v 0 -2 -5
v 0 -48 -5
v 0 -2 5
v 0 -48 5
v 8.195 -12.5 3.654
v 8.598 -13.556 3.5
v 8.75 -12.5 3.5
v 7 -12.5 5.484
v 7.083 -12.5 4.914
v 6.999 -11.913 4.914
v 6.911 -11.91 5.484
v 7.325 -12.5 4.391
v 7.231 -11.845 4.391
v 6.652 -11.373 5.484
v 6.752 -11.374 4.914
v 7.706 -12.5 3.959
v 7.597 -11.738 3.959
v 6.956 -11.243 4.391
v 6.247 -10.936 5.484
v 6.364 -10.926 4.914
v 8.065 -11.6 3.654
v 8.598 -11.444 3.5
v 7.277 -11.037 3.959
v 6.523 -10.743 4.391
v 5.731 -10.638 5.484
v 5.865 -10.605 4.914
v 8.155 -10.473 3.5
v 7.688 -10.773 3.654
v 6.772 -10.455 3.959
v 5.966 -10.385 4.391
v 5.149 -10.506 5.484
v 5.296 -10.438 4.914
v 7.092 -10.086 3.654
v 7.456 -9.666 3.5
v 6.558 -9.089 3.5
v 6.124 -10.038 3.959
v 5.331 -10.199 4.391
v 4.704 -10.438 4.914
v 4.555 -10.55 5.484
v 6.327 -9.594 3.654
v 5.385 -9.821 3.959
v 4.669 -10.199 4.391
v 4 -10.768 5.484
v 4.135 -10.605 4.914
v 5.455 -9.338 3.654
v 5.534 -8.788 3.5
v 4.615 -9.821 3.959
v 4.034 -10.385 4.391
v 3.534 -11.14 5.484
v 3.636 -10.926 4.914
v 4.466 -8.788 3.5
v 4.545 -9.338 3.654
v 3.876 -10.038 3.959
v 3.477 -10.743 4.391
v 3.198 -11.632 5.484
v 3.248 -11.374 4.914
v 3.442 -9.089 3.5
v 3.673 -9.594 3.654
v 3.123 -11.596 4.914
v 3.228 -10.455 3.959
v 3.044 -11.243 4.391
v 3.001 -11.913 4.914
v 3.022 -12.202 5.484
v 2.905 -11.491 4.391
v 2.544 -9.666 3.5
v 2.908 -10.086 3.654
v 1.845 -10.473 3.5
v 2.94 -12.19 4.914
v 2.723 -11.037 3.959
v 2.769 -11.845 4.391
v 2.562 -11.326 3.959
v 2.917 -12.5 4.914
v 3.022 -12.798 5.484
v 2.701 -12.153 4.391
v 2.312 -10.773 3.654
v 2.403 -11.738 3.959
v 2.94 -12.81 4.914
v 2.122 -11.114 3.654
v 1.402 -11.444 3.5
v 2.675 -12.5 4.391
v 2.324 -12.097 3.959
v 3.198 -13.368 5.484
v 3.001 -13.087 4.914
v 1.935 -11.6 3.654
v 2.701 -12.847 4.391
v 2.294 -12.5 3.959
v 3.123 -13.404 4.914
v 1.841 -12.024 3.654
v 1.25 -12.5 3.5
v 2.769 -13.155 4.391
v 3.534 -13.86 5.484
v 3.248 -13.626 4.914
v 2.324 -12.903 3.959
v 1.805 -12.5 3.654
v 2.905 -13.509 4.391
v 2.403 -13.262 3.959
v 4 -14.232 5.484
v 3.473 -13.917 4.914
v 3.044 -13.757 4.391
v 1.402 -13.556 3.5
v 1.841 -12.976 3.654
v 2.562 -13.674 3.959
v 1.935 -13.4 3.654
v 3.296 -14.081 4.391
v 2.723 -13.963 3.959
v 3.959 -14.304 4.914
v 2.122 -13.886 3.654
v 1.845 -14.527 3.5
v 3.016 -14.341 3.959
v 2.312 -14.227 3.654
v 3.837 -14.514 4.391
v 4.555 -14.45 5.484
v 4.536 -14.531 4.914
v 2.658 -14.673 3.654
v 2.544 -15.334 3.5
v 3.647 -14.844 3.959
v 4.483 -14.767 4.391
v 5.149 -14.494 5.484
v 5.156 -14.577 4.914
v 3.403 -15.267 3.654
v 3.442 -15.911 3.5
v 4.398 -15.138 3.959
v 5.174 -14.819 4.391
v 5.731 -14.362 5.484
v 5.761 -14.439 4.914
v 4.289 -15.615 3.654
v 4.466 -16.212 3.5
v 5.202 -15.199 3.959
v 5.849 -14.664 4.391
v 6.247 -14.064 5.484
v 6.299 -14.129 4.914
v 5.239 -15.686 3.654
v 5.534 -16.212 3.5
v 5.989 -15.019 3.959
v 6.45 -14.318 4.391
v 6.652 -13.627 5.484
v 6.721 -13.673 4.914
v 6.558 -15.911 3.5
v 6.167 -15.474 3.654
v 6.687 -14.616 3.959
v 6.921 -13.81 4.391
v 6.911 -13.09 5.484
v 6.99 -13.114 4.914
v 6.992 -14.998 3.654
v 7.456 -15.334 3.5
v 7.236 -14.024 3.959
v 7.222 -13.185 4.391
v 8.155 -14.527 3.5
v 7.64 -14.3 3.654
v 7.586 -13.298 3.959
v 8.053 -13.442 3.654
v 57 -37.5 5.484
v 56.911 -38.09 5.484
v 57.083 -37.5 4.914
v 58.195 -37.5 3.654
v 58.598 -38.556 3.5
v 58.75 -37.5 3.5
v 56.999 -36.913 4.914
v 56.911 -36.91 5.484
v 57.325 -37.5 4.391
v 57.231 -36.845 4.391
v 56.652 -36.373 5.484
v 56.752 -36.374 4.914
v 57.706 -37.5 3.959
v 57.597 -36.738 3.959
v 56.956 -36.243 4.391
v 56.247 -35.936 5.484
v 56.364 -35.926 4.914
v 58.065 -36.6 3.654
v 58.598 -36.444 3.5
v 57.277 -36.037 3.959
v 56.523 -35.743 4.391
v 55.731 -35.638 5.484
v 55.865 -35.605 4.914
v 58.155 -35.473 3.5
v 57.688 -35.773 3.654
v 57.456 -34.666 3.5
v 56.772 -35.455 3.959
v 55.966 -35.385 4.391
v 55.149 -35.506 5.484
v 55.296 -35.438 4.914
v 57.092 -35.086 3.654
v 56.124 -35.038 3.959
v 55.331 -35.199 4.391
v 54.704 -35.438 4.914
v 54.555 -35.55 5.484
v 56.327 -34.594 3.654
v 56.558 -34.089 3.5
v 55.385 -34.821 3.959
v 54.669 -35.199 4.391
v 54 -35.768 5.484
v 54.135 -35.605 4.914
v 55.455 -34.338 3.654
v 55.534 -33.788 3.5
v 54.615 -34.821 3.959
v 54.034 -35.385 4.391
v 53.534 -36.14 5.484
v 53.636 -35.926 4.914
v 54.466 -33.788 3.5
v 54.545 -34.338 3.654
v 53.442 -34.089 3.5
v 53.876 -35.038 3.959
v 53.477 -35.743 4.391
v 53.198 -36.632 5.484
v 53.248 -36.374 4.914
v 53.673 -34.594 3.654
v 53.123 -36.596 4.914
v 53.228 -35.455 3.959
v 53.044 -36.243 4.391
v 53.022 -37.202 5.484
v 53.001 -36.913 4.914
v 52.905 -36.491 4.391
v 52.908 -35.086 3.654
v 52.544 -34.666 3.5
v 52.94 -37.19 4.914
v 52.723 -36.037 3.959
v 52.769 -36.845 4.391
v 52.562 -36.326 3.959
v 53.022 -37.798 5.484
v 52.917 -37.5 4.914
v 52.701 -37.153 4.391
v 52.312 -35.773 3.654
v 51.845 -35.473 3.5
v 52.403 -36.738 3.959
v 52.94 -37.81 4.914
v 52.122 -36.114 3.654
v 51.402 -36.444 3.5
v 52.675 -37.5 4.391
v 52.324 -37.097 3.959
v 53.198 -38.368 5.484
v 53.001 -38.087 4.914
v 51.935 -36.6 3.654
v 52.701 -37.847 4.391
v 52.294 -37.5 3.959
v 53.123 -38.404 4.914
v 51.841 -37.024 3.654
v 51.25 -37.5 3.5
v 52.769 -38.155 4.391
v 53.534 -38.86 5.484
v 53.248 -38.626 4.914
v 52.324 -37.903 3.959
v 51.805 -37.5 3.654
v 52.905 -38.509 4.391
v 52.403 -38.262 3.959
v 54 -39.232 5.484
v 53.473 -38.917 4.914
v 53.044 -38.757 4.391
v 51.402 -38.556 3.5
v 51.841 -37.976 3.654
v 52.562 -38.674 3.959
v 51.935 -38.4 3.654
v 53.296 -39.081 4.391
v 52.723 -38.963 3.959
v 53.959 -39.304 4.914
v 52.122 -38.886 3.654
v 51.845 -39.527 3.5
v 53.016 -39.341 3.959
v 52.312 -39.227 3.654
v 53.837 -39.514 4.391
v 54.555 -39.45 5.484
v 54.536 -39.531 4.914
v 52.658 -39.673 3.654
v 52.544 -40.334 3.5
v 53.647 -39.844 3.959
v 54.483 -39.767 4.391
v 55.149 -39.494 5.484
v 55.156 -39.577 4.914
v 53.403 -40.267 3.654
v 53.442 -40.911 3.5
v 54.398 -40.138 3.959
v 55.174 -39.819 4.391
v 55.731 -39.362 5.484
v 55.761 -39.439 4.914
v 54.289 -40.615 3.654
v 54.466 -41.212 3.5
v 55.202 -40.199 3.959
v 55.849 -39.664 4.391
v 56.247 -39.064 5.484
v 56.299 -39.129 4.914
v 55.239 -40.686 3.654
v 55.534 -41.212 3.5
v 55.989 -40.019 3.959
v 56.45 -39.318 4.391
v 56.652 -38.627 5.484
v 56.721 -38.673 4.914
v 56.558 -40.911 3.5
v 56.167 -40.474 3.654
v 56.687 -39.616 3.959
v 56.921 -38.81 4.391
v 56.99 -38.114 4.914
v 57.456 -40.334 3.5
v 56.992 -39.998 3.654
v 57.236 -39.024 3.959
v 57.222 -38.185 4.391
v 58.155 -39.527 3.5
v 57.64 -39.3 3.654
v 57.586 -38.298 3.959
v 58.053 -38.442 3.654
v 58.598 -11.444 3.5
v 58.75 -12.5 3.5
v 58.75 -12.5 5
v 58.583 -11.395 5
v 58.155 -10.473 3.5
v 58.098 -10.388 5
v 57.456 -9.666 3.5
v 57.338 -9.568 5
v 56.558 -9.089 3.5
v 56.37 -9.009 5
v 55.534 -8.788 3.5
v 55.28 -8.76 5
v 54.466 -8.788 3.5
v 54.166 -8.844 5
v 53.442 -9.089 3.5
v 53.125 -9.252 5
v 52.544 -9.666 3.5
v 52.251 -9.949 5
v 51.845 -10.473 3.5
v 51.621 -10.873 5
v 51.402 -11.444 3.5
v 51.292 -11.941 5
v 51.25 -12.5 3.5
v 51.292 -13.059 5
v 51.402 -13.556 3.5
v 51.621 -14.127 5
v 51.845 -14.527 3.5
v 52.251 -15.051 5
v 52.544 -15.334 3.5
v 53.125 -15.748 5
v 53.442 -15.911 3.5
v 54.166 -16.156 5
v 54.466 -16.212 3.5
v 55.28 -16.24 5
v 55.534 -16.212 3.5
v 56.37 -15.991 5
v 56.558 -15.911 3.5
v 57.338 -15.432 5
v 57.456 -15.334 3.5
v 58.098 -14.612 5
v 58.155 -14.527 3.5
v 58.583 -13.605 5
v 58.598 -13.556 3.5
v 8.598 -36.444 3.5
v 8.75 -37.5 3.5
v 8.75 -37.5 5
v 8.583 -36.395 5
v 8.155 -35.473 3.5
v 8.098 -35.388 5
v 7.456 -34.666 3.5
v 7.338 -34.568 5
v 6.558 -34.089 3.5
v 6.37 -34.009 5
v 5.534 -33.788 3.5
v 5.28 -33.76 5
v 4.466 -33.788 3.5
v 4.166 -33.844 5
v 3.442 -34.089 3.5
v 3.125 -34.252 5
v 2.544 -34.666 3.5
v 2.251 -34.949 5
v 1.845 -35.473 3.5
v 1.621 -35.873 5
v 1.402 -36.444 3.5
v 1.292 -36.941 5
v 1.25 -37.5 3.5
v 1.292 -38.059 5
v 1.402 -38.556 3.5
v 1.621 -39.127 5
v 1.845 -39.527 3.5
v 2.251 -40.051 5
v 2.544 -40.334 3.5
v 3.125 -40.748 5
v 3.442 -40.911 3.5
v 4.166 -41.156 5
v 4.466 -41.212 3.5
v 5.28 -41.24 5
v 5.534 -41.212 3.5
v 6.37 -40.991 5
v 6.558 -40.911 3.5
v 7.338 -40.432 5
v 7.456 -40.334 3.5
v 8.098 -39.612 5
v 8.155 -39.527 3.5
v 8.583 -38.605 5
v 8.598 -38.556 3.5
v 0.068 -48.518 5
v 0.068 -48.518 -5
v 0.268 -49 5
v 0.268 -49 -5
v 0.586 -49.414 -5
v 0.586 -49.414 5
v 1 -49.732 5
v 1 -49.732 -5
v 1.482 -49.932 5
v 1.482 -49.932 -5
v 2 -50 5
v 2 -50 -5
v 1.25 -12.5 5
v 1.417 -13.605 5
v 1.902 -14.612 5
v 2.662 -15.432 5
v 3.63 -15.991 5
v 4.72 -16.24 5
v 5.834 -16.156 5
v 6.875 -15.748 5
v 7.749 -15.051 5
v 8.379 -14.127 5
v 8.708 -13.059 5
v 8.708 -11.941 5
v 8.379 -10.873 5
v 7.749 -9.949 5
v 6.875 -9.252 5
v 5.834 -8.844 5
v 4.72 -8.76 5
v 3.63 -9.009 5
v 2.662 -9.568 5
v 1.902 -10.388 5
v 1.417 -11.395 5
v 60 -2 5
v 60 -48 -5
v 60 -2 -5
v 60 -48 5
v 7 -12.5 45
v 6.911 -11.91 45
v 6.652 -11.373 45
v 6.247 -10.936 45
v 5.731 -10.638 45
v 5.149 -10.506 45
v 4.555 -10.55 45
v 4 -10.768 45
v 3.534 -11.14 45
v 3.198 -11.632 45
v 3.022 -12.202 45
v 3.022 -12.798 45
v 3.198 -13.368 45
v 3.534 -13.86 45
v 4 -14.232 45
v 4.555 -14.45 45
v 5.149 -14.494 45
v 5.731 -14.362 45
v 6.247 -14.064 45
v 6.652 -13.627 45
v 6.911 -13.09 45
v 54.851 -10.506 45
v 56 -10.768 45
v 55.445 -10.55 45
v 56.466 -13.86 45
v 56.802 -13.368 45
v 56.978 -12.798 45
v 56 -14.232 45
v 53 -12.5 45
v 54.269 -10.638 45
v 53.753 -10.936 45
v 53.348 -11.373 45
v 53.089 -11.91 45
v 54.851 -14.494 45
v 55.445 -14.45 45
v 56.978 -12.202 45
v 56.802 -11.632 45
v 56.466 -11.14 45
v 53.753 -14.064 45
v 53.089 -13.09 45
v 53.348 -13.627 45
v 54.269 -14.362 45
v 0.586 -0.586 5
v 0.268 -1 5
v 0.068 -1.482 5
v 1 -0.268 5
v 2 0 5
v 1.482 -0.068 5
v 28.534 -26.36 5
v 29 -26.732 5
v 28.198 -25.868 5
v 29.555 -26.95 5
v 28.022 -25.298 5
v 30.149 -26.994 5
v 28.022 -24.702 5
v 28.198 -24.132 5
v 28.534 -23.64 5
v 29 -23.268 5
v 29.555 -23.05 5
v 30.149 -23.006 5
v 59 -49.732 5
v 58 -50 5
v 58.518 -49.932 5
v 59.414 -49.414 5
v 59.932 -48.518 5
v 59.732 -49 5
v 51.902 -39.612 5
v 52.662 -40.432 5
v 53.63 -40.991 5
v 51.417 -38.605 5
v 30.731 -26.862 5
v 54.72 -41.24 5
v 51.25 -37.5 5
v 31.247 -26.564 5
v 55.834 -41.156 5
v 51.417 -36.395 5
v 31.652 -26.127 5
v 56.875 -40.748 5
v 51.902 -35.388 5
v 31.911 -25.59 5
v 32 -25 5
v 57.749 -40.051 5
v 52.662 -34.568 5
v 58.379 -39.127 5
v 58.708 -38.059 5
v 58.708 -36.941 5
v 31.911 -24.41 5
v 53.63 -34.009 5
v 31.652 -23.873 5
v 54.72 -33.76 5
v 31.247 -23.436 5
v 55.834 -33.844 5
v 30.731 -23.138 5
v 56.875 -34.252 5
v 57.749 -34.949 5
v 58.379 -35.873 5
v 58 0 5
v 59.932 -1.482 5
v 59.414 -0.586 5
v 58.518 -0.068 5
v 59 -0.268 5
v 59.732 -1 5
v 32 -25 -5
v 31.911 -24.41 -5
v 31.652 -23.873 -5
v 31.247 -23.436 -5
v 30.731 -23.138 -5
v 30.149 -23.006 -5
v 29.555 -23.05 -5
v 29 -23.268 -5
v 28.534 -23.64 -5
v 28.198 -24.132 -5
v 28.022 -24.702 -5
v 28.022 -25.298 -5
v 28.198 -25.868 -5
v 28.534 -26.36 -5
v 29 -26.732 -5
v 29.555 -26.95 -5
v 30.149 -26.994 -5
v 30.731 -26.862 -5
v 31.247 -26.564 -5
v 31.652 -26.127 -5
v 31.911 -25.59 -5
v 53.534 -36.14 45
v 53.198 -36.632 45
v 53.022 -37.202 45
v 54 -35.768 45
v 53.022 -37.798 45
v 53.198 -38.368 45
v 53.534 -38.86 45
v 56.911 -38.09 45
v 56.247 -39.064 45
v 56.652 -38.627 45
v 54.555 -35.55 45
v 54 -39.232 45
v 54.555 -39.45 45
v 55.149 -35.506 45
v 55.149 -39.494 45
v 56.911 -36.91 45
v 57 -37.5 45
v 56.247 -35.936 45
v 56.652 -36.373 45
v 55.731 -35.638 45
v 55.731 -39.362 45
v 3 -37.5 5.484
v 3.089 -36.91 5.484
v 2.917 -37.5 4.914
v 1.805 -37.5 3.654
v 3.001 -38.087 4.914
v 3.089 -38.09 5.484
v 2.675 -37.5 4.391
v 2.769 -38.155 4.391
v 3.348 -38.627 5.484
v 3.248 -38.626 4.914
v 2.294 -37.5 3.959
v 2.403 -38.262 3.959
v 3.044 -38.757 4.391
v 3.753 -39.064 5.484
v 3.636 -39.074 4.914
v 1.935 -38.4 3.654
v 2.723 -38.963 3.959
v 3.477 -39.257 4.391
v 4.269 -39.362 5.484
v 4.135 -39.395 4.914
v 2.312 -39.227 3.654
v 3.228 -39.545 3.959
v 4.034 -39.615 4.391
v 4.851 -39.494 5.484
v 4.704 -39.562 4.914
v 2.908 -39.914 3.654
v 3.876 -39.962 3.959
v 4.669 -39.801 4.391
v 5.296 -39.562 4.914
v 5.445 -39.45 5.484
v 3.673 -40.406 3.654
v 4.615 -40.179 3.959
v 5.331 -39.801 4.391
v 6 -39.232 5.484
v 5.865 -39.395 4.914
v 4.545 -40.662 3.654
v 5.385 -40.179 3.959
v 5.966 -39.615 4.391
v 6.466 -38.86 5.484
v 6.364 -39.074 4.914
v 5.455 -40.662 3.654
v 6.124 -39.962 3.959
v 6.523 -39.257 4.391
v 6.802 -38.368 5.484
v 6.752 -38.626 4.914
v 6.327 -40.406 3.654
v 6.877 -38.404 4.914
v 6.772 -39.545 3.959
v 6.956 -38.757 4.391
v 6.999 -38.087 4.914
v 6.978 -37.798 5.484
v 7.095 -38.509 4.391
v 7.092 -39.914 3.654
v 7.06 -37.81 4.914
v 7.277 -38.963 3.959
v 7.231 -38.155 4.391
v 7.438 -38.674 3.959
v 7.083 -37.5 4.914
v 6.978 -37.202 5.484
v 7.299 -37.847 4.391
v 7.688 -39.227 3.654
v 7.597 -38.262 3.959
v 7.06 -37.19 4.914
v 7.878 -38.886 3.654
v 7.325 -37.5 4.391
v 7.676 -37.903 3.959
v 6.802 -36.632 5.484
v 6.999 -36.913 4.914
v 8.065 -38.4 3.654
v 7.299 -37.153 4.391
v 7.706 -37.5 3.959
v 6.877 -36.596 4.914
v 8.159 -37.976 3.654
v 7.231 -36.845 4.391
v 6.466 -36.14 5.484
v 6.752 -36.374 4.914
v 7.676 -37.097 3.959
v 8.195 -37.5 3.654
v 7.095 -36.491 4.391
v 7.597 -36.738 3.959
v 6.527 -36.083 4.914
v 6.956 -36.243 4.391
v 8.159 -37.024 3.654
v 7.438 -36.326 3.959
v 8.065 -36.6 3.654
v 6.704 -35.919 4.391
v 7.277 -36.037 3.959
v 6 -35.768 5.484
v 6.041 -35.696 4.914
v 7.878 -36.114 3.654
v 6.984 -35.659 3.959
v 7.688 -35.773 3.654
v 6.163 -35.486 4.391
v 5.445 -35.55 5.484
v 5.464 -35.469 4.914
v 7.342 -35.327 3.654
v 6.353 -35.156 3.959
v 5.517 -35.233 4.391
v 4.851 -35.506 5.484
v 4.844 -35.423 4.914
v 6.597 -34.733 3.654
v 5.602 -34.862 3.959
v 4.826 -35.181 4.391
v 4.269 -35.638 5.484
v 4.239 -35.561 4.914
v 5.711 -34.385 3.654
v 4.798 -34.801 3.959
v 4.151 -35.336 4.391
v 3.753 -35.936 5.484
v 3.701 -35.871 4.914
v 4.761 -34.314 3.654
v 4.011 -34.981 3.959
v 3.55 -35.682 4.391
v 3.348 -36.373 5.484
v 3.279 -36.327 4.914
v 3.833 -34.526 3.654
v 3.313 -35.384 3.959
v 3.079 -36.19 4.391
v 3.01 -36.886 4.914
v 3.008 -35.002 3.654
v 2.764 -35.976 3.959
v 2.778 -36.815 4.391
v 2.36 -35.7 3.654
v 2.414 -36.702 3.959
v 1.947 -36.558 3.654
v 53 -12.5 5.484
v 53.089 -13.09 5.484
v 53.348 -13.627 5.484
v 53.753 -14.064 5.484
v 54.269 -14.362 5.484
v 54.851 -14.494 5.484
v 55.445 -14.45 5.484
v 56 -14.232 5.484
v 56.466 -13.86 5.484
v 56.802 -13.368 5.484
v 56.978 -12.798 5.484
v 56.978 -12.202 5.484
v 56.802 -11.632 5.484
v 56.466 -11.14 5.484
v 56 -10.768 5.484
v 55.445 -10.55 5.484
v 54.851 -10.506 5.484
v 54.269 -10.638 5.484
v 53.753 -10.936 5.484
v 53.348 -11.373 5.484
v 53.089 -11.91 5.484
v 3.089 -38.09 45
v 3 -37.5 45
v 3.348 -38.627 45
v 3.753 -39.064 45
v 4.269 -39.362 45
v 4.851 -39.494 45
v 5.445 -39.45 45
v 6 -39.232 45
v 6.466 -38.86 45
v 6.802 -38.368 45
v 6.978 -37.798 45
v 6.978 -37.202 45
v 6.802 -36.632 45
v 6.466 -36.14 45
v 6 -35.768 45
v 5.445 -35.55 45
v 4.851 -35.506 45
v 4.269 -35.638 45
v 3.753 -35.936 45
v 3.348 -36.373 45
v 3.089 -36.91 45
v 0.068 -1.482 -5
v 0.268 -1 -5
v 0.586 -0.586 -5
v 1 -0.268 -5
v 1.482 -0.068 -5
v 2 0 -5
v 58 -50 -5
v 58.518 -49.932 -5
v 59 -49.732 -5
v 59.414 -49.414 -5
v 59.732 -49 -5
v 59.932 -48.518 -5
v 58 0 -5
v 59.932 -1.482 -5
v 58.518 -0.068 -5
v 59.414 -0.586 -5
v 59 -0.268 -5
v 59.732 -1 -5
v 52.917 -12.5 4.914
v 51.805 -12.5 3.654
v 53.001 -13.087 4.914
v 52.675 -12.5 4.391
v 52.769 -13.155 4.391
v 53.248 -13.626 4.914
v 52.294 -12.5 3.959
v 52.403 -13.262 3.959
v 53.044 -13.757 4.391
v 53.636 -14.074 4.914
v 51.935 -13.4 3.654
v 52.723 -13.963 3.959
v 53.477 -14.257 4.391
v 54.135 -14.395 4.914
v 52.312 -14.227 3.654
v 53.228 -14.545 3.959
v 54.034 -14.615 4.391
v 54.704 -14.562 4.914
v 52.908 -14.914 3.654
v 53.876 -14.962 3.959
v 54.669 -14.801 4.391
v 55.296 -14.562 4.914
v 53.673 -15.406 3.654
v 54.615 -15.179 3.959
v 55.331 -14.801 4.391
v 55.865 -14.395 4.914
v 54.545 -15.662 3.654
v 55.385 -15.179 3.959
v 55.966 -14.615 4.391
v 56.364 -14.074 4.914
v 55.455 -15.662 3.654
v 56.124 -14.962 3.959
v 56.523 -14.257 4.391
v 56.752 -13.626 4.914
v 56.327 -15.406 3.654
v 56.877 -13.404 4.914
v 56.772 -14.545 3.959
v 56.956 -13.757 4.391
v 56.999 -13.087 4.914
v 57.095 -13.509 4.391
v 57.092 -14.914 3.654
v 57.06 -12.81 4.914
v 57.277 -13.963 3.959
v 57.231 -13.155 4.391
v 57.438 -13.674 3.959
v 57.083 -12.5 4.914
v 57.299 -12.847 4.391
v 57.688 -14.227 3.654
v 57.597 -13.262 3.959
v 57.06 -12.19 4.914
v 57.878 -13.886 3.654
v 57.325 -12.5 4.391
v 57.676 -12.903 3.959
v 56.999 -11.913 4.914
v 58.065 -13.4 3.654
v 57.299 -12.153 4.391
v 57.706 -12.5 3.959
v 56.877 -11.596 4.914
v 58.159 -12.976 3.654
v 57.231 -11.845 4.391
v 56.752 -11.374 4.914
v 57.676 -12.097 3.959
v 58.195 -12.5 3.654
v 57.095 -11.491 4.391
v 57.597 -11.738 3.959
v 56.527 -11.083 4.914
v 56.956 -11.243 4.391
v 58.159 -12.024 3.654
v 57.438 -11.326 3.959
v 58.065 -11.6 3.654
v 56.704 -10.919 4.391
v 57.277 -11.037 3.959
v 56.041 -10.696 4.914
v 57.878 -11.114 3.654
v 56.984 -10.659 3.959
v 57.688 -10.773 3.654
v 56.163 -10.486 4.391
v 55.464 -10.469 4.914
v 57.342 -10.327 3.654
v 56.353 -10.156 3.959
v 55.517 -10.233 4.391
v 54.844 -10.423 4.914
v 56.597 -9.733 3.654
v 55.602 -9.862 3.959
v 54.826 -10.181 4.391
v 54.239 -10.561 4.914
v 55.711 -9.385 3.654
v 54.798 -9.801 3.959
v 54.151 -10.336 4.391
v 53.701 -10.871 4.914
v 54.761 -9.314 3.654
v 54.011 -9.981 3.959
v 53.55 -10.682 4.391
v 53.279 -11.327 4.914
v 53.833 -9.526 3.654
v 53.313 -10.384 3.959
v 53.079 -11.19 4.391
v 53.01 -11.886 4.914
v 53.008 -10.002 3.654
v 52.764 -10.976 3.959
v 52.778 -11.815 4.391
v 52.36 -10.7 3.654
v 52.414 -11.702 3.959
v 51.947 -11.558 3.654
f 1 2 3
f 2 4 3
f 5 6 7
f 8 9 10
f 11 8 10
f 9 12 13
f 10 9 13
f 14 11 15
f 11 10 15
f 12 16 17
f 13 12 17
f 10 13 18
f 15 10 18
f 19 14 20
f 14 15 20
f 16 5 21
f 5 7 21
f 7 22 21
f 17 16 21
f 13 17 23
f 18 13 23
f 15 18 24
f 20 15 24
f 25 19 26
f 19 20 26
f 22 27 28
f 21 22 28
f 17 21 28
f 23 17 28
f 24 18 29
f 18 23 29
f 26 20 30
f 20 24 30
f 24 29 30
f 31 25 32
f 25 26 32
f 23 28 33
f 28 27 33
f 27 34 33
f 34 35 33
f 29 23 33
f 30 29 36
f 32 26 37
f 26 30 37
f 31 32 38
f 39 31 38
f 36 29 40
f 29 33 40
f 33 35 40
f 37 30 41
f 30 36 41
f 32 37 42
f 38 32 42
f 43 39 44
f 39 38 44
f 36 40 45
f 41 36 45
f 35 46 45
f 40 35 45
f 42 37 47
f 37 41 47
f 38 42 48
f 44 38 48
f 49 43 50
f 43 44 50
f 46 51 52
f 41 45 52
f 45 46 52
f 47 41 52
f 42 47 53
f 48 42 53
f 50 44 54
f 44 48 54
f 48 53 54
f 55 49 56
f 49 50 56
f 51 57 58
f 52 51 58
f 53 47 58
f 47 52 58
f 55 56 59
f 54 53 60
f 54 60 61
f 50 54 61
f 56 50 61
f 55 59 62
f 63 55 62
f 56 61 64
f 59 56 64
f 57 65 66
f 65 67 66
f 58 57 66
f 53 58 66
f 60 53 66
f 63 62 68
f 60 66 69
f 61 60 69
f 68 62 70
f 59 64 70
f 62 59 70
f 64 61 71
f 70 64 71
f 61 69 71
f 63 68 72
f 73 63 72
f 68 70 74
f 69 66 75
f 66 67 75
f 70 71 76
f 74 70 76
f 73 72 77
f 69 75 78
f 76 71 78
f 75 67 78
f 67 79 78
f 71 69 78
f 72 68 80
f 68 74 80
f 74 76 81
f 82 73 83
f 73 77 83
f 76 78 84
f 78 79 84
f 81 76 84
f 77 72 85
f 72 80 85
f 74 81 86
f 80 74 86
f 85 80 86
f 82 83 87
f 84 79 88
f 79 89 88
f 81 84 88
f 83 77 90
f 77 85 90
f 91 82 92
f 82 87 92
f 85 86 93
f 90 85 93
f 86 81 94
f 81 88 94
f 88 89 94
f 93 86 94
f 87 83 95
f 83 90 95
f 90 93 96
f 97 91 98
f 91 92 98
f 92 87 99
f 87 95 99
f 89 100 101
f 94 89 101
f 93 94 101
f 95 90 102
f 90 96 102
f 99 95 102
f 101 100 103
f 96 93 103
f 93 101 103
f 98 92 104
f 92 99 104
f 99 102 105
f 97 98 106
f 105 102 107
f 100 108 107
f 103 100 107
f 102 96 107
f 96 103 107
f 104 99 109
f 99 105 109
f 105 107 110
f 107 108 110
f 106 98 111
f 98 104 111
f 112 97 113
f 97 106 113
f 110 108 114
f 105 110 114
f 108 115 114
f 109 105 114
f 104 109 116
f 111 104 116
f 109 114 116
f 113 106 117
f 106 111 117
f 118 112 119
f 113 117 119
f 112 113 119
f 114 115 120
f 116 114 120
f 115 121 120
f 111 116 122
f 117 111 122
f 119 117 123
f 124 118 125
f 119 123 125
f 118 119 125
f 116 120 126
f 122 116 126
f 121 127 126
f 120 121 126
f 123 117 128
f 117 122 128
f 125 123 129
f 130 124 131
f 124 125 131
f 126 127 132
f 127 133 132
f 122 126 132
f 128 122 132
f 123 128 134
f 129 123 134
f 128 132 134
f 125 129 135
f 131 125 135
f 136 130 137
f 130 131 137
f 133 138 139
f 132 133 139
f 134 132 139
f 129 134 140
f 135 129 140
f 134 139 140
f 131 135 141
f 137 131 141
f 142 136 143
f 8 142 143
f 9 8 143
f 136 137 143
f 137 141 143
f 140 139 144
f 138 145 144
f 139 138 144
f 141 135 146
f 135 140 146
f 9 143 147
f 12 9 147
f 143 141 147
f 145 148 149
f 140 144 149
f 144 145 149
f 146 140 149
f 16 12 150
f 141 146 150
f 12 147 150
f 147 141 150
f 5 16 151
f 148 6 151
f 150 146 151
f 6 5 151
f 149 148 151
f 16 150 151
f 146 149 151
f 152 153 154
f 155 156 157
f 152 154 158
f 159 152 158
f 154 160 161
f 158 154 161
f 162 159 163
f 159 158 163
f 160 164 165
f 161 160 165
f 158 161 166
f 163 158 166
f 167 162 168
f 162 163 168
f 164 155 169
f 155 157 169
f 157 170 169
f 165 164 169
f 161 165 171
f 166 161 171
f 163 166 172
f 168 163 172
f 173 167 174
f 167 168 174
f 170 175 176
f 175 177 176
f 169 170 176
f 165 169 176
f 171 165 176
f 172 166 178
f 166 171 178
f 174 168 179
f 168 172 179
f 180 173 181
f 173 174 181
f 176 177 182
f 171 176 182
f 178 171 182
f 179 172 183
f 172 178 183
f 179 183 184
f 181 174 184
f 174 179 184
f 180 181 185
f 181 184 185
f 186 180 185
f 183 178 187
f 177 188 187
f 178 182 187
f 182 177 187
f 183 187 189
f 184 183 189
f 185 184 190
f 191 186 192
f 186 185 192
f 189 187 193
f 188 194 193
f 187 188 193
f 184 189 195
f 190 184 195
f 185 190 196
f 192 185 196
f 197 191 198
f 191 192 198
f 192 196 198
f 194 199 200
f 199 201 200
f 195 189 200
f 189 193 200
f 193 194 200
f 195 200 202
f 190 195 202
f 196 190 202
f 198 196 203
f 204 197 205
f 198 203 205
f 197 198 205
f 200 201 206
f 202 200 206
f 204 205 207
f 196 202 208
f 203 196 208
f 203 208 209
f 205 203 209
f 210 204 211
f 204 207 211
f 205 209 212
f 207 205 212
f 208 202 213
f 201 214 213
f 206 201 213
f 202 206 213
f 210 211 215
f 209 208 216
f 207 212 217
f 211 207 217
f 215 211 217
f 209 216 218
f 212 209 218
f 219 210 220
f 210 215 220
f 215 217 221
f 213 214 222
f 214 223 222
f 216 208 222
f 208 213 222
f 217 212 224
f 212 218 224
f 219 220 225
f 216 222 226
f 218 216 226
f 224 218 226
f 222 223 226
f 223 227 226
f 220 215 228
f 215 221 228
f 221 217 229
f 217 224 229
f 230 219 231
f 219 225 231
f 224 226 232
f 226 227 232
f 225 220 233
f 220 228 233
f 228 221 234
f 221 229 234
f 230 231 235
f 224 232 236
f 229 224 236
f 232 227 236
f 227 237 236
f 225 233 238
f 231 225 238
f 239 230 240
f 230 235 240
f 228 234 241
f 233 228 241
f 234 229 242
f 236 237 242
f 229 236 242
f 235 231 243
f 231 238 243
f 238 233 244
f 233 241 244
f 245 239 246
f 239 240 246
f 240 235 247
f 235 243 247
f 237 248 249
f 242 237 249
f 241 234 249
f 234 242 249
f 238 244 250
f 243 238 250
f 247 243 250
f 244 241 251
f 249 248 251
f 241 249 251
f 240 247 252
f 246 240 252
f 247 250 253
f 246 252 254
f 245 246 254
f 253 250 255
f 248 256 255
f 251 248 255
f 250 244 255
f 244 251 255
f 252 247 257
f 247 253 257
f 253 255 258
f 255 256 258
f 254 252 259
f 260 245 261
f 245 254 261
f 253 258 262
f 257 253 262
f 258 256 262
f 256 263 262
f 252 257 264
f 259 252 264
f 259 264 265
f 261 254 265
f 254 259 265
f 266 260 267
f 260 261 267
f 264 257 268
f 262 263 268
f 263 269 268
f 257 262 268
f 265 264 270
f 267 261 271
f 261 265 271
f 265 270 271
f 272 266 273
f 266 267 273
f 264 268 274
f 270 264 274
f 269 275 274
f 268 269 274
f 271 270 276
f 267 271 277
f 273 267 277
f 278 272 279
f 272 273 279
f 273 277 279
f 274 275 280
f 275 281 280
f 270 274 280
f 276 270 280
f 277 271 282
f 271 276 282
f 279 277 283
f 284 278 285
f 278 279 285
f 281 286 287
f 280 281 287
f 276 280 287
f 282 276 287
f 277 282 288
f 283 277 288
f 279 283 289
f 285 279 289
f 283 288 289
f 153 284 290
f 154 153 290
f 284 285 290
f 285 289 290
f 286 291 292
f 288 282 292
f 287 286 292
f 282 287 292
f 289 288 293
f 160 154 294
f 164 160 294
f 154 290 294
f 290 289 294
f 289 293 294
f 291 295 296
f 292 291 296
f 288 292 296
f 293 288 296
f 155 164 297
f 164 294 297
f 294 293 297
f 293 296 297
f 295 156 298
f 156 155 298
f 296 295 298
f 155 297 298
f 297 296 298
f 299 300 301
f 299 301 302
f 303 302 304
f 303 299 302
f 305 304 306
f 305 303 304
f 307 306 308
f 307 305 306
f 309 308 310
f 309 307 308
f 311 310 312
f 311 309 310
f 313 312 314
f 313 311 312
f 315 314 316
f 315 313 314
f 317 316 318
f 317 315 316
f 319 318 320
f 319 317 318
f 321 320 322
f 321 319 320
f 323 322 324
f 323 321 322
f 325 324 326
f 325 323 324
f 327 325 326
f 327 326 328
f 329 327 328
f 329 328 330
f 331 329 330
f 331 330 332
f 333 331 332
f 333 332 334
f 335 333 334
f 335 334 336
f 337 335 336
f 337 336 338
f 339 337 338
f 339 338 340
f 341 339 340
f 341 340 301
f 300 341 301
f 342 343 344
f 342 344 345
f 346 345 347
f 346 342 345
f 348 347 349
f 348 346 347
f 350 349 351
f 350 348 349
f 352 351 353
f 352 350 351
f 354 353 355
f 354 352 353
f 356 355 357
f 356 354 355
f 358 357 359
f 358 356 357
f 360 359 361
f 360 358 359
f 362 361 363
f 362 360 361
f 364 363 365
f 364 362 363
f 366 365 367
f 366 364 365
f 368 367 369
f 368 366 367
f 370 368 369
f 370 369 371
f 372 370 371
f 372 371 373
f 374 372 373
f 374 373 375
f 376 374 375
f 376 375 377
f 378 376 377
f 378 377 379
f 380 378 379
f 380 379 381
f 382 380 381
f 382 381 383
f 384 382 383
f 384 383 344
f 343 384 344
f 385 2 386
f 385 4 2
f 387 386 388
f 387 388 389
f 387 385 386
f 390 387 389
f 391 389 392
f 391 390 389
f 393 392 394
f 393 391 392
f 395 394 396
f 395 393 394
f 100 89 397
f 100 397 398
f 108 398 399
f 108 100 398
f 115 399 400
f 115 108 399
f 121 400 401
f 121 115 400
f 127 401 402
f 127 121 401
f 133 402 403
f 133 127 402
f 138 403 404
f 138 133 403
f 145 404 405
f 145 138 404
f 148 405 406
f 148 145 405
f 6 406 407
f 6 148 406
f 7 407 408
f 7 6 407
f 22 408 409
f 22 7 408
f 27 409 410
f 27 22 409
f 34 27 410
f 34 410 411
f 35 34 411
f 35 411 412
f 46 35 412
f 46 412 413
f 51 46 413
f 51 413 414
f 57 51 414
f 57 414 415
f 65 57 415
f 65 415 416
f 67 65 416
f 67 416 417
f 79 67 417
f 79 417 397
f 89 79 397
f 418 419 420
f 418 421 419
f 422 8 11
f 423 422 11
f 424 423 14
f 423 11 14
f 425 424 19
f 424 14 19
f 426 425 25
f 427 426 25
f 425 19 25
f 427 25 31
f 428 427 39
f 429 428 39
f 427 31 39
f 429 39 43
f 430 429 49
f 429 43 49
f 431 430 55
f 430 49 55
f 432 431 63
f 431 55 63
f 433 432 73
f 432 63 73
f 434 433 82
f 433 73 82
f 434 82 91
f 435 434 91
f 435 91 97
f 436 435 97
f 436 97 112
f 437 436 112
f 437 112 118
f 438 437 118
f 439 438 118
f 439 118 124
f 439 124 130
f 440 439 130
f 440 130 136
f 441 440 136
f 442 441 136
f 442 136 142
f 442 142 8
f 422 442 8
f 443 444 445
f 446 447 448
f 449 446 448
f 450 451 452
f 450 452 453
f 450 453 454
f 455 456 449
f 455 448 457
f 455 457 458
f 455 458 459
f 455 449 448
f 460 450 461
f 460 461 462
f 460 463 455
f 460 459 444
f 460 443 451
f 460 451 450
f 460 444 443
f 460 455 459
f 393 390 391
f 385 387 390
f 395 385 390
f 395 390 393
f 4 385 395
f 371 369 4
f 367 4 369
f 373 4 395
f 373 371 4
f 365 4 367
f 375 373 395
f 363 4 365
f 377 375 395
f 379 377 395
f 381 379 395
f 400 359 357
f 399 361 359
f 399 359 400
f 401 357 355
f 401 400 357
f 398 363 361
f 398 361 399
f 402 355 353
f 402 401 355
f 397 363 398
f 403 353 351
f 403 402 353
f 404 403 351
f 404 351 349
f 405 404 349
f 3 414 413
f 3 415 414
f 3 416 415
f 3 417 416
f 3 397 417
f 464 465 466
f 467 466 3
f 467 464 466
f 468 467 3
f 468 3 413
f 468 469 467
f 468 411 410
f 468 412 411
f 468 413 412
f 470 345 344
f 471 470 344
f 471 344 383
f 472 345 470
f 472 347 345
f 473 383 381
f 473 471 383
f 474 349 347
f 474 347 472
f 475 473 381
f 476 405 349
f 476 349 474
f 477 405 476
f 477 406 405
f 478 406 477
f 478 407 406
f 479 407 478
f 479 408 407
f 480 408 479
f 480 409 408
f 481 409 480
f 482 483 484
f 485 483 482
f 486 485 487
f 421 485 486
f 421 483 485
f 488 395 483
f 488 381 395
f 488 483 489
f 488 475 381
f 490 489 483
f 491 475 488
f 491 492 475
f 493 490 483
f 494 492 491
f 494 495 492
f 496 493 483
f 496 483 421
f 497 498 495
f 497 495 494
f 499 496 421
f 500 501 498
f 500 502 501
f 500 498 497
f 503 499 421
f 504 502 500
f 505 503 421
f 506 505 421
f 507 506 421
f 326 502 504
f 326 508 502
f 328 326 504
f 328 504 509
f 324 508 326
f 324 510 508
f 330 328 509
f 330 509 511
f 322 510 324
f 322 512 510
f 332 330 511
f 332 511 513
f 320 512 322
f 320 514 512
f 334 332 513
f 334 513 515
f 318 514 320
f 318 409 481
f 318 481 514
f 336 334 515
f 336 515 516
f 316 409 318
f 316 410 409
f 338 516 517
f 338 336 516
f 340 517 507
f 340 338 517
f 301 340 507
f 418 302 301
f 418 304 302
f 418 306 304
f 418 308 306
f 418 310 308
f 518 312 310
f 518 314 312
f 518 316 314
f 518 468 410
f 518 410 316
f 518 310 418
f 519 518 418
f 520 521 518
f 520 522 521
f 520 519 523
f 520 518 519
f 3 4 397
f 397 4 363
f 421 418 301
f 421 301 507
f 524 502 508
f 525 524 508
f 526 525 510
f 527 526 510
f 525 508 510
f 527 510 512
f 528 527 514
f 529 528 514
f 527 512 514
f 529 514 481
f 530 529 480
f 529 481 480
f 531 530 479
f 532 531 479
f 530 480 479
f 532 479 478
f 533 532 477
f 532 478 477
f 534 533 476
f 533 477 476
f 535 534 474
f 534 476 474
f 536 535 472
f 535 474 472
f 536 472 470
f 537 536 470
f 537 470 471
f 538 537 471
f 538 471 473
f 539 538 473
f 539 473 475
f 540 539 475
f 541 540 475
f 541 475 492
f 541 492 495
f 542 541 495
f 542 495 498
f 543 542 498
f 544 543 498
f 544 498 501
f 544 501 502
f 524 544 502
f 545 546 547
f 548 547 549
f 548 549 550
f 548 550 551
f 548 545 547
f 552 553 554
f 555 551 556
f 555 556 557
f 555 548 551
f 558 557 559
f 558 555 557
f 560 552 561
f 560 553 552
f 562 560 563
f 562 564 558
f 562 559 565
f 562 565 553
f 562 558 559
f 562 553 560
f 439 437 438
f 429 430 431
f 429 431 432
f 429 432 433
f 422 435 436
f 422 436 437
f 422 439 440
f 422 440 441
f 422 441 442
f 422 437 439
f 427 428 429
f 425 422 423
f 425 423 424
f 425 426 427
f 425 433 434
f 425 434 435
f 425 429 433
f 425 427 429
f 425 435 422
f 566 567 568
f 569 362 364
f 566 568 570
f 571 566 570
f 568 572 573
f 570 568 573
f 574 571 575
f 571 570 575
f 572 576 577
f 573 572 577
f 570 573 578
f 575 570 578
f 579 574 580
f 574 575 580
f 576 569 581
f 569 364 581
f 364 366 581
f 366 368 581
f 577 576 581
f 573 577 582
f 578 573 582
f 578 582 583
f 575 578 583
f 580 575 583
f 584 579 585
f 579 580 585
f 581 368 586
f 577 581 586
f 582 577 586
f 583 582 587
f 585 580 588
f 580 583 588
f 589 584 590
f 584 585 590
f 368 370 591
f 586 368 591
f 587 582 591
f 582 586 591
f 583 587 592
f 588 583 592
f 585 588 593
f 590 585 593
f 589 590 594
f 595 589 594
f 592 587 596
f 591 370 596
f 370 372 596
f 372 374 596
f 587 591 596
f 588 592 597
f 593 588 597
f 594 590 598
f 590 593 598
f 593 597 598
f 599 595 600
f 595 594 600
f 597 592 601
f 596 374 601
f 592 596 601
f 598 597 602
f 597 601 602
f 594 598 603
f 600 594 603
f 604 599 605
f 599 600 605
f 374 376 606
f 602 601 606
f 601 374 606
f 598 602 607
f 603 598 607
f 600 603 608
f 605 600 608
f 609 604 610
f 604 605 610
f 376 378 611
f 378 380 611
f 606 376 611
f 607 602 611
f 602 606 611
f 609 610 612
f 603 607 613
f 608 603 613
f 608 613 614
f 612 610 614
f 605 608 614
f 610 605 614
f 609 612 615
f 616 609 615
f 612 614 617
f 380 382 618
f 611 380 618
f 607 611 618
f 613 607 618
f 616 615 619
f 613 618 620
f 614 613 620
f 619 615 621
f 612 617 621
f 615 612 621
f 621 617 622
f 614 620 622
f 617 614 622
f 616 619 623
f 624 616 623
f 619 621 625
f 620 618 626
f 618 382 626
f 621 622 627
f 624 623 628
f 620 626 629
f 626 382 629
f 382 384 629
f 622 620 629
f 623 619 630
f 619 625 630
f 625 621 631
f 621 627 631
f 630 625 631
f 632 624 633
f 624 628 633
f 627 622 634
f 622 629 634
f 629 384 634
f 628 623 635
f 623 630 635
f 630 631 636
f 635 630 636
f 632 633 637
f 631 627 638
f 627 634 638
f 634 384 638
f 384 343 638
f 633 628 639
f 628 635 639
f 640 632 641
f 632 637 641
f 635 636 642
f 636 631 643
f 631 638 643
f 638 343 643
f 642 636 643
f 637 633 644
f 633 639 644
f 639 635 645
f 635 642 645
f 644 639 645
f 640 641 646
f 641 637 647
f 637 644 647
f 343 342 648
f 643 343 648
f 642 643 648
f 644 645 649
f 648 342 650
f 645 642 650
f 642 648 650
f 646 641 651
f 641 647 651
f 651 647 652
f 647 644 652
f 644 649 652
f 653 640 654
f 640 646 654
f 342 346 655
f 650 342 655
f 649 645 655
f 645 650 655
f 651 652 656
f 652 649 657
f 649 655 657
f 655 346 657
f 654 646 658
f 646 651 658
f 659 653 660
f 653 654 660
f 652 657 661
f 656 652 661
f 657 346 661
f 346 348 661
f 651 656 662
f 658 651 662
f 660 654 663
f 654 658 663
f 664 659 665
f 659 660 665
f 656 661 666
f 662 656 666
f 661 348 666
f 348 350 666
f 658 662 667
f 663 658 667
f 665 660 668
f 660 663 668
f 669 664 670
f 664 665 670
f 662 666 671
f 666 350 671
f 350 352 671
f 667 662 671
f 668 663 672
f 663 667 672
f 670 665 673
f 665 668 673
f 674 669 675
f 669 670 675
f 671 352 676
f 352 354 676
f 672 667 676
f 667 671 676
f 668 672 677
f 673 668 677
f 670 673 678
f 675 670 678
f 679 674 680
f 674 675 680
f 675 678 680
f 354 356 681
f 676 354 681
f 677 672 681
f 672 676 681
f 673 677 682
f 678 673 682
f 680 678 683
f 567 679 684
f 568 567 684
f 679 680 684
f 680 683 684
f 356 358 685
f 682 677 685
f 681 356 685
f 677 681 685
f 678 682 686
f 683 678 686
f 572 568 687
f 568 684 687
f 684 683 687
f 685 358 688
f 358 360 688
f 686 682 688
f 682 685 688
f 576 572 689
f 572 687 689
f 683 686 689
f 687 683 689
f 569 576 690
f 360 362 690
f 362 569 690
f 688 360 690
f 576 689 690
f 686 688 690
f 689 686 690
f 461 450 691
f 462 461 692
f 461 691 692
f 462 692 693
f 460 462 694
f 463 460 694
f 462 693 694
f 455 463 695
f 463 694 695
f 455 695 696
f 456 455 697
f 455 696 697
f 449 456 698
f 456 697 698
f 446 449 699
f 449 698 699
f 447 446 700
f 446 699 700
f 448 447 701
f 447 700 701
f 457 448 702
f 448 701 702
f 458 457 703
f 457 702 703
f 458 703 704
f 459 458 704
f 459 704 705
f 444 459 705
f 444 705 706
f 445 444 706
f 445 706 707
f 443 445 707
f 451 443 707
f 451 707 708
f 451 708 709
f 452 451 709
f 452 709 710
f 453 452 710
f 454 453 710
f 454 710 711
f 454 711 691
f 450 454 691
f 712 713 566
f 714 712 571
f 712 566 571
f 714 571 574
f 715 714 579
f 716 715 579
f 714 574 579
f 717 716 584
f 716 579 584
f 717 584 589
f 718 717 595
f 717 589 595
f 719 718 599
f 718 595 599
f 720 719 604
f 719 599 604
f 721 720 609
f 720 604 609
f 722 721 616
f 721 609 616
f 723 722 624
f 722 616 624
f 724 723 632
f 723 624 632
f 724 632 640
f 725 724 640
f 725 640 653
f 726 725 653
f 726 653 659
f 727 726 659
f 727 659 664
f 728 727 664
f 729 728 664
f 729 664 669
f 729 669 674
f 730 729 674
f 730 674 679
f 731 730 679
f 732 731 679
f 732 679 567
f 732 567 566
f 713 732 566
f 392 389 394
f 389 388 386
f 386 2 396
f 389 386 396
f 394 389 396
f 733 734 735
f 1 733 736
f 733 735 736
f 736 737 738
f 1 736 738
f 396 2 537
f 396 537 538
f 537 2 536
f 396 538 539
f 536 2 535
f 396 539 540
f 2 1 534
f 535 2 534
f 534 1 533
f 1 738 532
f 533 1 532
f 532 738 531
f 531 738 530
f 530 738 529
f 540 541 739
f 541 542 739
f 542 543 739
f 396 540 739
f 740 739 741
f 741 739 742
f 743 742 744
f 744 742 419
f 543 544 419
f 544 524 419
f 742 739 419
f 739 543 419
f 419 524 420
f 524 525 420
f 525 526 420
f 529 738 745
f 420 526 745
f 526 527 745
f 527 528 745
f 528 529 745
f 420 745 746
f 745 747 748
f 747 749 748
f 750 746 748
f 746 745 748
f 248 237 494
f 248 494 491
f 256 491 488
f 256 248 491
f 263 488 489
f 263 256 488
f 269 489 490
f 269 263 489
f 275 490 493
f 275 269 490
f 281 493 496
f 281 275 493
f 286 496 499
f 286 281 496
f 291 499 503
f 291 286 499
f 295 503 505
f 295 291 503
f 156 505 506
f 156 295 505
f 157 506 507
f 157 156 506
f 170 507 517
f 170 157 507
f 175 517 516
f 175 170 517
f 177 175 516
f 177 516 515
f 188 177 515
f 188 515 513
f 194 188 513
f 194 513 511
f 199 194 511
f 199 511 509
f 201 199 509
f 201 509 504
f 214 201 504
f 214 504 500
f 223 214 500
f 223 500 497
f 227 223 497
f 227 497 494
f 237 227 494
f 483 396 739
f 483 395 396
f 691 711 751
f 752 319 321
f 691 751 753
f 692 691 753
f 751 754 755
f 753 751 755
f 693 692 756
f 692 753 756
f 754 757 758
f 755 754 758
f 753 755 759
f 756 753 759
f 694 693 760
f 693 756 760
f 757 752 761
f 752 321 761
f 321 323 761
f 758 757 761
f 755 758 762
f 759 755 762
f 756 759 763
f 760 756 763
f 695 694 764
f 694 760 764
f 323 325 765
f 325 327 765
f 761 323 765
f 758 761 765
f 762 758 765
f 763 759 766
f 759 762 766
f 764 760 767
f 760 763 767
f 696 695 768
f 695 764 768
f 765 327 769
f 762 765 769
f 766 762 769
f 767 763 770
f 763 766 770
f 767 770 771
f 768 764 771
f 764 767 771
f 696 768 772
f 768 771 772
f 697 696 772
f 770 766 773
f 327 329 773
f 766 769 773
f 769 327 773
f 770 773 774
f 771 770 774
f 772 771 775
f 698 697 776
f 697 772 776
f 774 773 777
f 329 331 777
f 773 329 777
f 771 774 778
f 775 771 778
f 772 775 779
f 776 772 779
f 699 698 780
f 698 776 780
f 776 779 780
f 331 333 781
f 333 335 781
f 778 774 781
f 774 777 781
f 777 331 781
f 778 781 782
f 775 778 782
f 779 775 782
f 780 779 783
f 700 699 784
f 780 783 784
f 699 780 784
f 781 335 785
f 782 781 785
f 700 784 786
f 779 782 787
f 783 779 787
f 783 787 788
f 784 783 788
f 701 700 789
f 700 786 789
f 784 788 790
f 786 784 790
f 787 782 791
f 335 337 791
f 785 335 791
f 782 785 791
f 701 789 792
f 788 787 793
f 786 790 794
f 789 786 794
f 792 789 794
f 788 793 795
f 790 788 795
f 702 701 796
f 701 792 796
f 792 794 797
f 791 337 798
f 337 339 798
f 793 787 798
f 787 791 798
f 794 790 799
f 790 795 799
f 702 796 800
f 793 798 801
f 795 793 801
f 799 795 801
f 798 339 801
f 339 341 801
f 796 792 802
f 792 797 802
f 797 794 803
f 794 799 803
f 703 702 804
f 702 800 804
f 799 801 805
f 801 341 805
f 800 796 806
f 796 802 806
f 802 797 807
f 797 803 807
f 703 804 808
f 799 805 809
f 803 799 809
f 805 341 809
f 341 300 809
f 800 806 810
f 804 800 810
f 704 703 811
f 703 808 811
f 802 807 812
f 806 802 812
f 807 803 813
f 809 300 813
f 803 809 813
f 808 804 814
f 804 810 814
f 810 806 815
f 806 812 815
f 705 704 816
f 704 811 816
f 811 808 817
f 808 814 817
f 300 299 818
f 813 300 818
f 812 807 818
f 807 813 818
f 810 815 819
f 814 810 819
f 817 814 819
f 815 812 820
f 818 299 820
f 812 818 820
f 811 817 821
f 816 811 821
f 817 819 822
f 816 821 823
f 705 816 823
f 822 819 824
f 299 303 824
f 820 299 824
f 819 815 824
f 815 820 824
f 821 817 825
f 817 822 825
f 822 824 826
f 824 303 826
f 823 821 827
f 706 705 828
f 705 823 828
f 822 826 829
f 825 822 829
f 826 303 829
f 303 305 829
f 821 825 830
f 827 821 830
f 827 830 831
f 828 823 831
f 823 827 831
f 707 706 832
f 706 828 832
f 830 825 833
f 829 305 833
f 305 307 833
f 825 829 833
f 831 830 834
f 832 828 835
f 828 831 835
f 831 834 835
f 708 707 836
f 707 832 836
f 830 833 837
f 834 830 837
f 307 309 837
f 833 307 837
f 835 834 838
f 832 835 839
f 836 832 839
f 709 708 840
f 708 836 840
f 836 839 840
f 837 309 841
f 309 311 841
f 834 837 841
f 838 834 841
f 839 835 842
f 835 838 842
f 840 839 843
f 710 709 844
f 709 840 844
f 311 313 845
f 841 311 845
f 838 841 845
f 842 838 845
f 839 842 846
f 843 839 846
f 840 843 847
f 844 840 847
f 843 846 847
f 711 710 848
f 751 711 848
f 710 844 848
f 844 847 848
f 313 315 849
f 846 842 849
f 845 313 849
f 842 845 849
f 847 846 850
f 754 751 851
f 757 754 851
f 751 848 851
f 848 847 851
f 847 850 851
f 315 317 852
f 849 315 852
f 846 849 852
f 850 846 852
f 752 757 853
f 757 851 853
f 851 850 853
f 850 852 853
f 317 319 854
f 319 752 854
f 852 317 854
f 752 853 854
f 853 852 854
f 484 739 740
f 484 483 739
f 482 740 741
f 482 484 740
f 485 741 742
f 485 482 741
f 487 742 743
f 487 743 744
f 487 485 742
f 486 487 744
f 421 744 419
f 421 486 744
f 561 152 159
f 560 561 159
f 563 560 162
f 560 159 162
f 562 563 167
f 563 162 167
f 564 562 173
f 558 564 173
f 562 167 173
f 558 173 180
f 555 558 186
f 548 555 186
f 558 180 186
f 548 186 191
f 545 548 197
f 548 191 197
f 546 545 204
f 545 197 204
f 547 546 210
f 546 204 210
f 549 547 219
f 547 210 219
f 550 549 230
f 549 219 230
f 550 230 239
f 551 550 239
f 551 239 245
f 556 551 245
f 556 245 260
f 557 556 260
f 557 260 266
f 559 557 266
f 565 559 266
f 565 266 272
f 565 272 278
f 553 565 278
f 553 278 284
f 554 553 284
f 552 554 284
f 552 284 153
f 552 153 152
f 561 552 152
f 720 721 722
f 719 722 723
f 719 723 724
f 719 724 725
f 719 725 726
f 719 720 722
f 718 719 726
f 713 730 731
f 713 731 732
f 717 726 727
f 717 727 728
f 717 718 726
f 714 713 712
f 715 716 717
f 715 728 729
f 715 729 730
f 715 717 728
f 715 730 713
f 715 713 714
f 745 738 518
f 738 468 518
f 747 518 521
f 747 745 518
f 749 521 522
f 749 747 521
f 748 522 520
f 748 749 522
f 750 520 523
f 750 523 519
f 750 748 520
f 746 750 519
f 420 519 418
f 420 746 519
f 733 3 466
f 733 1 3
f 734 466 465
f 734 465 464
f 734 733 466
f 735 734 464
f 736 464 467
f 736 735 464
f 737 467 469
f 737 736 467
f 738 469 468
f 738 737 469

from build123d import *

# Parameters (mm, degrees)
ESQUISSE1_W             = 60
ESQUISSE1_H             = 50
BOSS_EXTRU_1_DEPTH      = 5
ESQUISSE2_R             = 2
BOSS_EXTRU_2_DEPTH      = 40
ESQUISSE3_R             = 2
ENL_V_MAT_EXTRU_1_DEPTH = 88.749643874
CONG_1_R                = 2
CONG_2_R                = 2
ENL_V_START             = -1.5
ESQUISSE4_R             = 3.75
ESQUISSE4_R_2           = 2
ENL_V_MAT_EXTRU_5_DEPTH = 1.5
CONG_5_R                = 2
CONG_6_R                = 2
CONG_7_R                = 2
CONG_8_R                = 2


with BuildPart() as part:
    # Esquisse1 → Boss.-Extru.1 (new, symmetric)
    with BuildSketch(Plane.XY):
        with Locations((30, -25)):
            Rectangle(ESQUISSE1_W, ESQUISSE1_H)
    extrude(amount=BOSS_EXTRU_1_DEPTH, both=True)

    # Esquisse2 → Boss.-Extru.2 (add)
    with BuildSketch(Plane.XY.offset(5)):
        with Locations((5, -12.5)):
            Circle(ESQUISSE2_R)
        with Locations(Location((5, -37.5, 0), (0, 0, 180))):
            Circle(ESQUISSE2_R)
        with Locations((55, -37.5)):
            Circle(ESQUISSE2_R)
        with Locations(Location((55, -12.5, 0), (0, 0, 180))):
            Circle(ESQUISSE2_R)
    extrude(amount=BOSS_EXTRU_2_DEPTH)

    # Esquisse3 → Enlèv. mat.-Extru.1 (cut, through all)
    with BuildSketch(Plane.XY.offset(5)):
        with Locations((30, -25)):
            Circle(ESQUISSE3_R)
    extrude(amount=-ENL_V_MAT_EXTRU_1_DEPTH, mode=Mode.SUBTRACT)

    # Congé1
    cong_1_edges = [part.edges().sort_by_distance(p)[0] for p in [
        (0, 0, 0),
    ]]
    fillet(cong_1_edges, radius=CONG_1_R)

    # Congé2
    cong_2_edges = [part.edges().sort_by_distance(p)[0] for p in [
        (60, 0, 0),
        (60, -50, 0),
        (0, -50, 0),
    ]]
    fillet(cong_2_edges, radius=CONG_2_R)

    # Esquisse4 → Enlèv. mat.-Extru.5 (cut)
    # profile 1 of 4: a face of its own
    with BuildSketch(Plane.XY.offset(5).offset(ENL_V_START)):
        with Locations((5, -37.5)):
            Circle(ESQUISSE4_R)
        with Locations(Location((5, -37.5, 0), (0, 0, 180))):
            Circle(ESQUISSE4_R_2, mode=Mode.SUBTRACT)
    # profile 2 of 4: a face of its own
    with BuildSketch(Plane.XY.offset(5).offset(ENL_V_START)):
        with Locations(Location((5, -12.5, 0), (0, 0, 180))):
            Circle(ESQUISSE4_R)
        with Locations((5, -12.5)):
            Circle(ESQUISSE4_R_2, mode=Mode.SUBTRACT)
    # profile 3 of 4: a face of its own
    with BuildSketch(Plane.XY.offset(5).offset(ENL_V_START)):
        with Locations((55, -12.5)):
            Circle(ESQUISSE4_R)
        with Locations(Location((55, -12.5, 0), (0, 0, 180))):
            Circle(ESQUISSE4_R_2, mode=Mode.SUBTRACT)
    # profile 4 of 4: a face of its own
    with BuildSketch(Plane.XY.offset(5).offset(ENL_V_START)):
        with Locations(Location((55, -37.5, 0), (0, 0, 180))):
            Circle(ESQUISSE4_R)
        with Locations((55, -37.5)):
            Circle(ESQUISSE4_R_2, mode=Mode.SUBTRACT)
    extrude(amount=ENL_V_MAT_EXTRU_5_DEPTH, mode=Mode.SUBTRACT)

    # Congé5
    # the kernel refuses this fillet: 2 mm, written as the material it adds along each edge
    with BuildSketch(Plane(origin=(55, -37.5, 3.5), x_dir=(1, 0, 0), z_dir=(0, -1, 0))) as cong_5_piece_1:
        with BuildLine():
            CenterArc((4, 1.984313483), CONG_5_R, 180, 82.819244219)
            Line((2, 1.984313483), (1.96, 1.984313483))
            Line((1.96, 1.984313483), (1.96, 0))
            Line((1.96, 0), (2, -0.04))
            ThreePointArc((2, -0.04), (2.875, -0.04), (3.745, -0.03968627))
            Line((3.745, -0.03968627), (3.75, 0))
        make_face()
    revolve(axis=Axis((55, -37.5, 3.5), (0, 0, 1)))

    # Congé6
    # the kernel refuses this fillet: 2 mm, written as the material it adds along each edge
    with BuildSketch(Plane(origin=(55, -12.5, 3.5), x_dir=(-1, 0, 0), z_dir=(0, 1, 0))) as cong_6_piece_1:
        with BuildLine():
            CenterArc((4, 1.984313483), CONG_6_R, 180, 82.819244219)
            Line((2, 1.984313483), (1.96, 1.984313483))
            Line((1.96, 1.984313483), (1.96, 0))
            Line((1.96, 0), (2, -0.04))
            ThreePointArc((2, -0.04), (2.875, -0.04), (3.745, -0.03968627))
            Line((3.745, -0.03968627), (3.75, 0))
        make_face()
    revolve(axis=Axis((55, -12.5, 3.5), (0, 0, 1)))

    # Congé7
    # the kernel refuses this fillet: 2 mm, written as the material it adds along each edge
    with BuildSketch(Plane(origin=(5, -12.5, 3.5), x_dir=(1, 0, 0), z_dir=(0, -1, 0))) as cong_7_piece_1:
        with BuildLine():
            CenterArc((4, 1.984313483), CONG_7_R, 180, 82.819244219)
            Line((2, 1.984313483), (1.96, 1.984313483))
            Line((1.96, 1.984313483), (1.96, 0))
            Line((1.96, 0), (2, -0.04))
            ThreePointArc((2, -0.04), (2.875, -0.04), (3.745, -0.03968627))
            Line((3.745, -0.03968627), (3.75, 0))
        make_face()
    revolve(axis=Axis((5, -12.5, 3.5), (0, 0, 1)))

    # Congé8
    # the kernel refuses this fillet: 2 mm, written as the material it adds along each edge
    with BuildSketch(Plane(origin=(5, -37.5, 3.5), x_dir=(-1, 0, 0), z_dir=(0, 1, 0))) as cong_8_piece_1:
        with BuildLine():
            CenterArc((4, 1.984313483), CONG_8_R, 180, 82.819244219)
            Line((2, 1.984313483), (1.96, 1.984313483))
            Line((1.96, 1.984313483), (1.96, 0))
            Line((1.96, 0), (2, -0.04))
            ThreePointArc((2, -0.04), (2.875, -0.04), (3.745, -0.03968627))
            Line((3.745, -0.03968627), (3.75, 0))
        make_face()
    revolve(axis=Axis((5, -37.5, 3.5), (0, 0, 1)))


solid = part.part
